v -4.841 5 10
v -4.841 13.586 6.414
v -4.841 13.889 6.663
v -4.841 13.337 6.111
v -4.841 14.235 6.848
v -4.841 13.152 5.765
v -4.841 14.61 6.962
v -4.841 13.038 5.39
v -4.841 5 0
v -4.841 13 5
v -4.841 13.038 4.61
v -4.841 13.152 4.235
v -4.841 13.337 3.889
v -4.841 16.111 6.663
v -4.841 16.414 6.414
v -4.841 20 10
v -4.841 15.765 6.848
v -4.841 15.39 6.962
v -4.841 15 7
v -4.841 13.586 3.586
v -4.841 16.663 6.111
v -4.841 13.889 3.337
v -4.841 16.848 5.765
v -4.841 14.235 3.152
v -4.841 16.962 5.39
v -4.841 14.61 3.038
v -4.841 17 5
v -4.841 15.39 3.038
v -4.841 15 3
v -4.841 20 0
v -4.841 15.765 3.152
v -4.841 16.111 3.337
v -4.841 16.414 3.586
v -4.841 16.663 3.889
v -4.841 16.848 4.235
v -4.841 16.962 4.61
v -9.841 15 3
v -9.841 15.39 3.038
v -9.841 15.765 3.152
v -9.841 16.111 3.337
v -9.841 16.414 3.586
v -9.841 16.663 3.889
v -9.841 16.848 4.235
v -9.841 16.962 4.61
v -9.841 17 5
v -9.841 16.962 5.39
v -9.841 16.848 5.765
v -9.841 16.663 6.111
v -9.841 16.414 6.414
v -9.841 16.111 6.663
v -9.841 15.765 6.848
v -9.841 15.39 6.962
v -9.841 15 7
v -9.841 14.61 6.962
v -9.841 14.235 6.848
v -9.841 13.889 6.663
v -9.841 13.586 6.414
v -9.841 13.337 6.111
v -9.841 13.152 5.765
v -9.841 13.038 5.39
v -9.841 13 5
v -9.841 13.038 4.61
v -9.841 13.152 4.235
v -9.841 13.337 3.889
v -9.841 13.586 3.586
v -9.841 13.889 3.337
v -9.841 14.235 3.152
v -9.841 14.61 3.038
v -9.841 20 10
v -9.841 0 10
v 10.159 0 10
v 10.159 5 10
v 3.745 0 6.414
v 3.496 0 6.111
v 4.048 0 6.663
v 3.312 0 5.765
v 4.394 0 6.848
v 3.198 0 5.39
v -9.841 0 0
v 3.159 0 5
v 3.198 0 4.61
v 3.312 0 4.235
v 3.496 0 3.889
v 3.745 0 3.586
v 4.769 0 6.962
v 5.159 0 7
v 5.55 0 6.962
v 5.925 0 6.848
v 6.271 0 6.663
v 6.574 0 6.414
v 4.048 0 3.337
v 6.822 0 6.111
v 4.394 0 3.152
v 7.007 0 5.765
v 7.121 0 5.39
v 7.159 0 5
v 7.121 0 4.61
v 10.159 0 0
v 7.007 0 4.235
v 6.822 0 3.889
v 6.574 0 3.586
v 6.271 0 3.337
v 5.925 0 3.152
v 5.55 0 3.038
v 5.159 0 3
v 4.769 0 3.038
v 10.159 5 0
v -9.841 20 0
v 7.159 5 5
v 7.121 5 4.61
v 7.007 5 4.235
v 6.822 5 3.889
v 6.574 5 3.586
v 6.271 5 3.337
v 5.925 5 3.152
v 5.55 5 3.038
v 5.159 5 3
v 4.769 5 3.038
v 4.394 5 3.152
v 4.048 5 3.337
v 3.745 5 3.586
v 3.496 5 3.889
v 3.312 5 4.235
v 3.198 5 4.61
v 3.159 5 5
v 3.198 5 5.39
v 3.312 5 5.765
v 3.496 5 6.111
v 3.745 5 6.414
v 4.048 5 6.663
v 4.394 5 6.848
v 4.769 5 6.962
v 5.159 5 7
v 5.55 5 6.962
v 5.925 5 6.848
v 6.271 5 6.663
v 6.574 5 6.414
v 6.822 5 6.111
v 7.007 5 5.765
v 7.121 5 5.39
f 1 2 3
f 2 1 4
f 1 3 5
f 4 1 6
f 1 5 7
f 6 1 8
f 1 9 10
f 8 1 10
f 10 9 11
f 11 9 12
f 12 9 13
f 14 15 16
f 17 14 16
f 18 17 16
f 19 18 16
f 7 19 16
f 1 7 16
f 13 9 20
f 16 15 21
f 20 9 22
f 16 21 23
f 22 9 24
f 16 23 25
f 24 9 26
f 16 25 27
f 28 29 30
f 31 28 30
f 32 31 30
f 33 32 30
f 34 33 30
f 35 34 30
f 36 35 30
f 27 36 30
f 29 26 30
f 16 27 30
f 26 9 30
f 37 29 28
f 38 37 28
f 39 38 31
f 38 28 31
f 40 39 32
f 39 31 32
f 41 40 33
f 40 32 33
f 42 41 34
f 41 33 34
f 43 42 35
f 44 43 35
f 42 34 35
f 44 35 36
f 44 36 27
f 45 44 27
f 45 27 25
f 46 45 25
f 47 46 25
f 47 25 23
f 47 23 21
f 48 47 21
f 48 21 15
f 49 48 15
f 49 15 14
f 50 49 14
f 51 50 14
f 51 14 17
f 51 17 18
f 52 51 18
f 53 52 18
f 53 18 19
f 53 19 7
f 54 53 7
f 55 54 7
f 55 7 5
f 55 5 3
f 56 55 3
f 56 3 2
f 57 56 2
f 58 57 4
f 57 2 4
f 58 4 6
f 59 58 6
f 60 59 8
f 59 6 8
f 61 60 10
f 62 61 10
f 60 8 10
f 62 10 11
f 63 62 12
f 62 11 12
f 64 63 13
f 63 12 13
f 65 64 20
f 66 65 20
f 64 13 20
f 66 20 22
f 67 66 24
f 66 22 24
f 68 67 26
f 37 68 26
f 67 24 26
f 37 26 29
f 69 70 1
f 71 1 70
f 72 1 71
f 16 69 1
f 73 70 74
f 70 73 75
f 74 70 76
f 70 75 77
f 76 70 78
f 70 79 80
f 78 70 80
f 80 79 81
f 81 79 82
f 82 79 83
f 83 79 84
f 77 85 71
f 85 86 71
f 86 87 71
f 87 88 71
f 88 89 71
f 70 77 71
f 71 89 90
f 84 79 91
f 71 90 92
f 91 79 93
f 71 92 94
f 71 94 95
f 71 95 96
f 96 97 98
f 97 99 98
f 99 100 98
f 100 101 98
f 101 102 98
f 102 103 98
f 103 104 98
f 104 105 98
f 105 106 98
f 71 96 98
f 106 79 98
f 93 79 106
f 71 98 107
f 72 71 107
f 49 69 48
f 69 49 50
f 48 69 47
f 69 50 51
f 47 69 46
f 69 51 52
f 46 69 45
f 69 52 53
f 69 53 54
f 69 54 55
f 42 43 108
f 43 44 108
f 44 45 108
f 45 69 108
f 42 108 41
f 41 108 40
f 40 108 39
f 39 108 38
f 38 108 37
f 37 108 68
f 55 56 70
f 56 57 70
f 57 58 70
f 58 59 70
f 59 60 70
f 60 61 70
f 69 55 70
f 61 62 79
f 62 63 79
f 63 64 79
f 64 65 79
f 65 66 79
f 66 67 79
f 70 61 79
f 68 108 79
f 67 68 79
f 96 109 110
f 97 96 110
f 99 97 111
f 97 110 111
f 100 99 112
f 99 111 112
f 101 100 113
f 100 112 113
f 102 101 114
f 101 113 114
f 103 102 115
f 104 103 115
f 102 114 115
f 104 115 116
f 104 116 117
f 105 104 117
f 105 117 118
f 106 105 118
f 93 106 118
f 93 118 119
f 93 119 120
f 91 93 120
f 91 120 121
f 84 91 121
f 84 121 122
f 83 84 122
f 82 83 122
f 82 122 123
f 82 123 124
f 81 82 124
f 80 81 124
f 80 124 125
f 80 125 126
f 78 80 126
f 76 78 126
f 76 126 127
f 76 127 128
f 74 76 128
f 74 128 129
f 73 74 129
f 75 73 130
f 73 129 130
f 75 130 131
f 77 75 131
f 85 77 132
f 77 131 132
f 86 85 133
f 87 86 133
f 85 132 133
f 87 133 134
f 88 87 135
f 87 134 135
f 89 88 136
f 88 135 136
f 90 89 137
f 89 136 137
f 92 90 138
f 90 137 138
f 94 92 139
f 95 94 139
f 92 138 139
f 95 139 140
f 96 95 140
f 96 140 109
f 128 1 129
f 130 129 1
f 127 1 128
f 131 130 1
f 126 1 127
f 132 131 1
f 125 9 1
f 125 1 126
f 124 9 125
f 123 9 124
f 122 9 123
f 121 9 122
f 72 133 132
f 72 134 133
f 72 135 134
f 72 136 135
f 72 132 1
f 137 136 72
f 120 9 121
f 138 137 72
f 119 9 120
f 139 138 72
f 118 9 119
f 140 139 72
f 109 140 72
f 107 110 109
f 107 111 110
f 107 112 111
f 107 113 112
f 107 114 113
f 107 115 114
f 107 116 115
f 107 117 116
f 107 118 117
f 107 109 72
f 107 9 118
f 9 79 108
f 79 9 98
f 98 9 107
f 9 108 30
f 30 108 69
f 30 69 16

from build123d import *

# Parameters (mm, degrees)
SKETCH1_W           = 5
SKETCH1_H           = 15
SKETCH1_H_2         = 5
SKETCH1_W_2         = 15
BOSS_EXTRUDE2_DEPTH = 10
SKETCH3_R           = 2
CUT_EXTRUDE1_DEPTH  = 6
SKETCH4_R           = 2
CUT_EXTRUDE2_DEPTH  = 6


with BuildPart() as part:
    # Sketch1 → Boss-Extrude2 (new body)
    with BuildSketch(Plane.XY):
        with Locations((-7.340572317, 12.5)):
            Rectangle(SKETCH1_W, SKETCH1_H)
        with Locations((-7.340572317, 2.5)):
            Rectangle(SKETCH1_W, SKETCH1_H_2)
        with Locations((2.659427683, 2.5)):
            Rectangle(SKETCH1_W_2, SKETCH1_H_2)
    extrude(amount=BOSS_EXTRUDE2_DEPTH)

    # Sketch3 → Cut-Extrude1 (cut, through all)
    with BuildSketch(Plane(origin=(0, 5, 0), x_dir=(1, 0, 0), z_dir=(0, 1, 0))):
        with Locations((5.159427683, -5)):
            Circle(SKETCH3_R)
    extrude(amount=-CUT_EXTRUDE1_DEPTH, mode=Mode.SUBTRACT)

    # Sketch4 → Cut-Extrude2 (cut, through all)
    with BuildSketch(Plane(origin=(-4.840572317, 0, 0), x_dir=(0, 0, -1), z_dir=(1, 0, 0))):
        with Locations((-5, 15)):
            Circle(SKETCH4_R)
    extrude(amount=-CUT_EXTRUDE2_DEPTH, mode=Mode.SUBTRACT)


solid = part.part
